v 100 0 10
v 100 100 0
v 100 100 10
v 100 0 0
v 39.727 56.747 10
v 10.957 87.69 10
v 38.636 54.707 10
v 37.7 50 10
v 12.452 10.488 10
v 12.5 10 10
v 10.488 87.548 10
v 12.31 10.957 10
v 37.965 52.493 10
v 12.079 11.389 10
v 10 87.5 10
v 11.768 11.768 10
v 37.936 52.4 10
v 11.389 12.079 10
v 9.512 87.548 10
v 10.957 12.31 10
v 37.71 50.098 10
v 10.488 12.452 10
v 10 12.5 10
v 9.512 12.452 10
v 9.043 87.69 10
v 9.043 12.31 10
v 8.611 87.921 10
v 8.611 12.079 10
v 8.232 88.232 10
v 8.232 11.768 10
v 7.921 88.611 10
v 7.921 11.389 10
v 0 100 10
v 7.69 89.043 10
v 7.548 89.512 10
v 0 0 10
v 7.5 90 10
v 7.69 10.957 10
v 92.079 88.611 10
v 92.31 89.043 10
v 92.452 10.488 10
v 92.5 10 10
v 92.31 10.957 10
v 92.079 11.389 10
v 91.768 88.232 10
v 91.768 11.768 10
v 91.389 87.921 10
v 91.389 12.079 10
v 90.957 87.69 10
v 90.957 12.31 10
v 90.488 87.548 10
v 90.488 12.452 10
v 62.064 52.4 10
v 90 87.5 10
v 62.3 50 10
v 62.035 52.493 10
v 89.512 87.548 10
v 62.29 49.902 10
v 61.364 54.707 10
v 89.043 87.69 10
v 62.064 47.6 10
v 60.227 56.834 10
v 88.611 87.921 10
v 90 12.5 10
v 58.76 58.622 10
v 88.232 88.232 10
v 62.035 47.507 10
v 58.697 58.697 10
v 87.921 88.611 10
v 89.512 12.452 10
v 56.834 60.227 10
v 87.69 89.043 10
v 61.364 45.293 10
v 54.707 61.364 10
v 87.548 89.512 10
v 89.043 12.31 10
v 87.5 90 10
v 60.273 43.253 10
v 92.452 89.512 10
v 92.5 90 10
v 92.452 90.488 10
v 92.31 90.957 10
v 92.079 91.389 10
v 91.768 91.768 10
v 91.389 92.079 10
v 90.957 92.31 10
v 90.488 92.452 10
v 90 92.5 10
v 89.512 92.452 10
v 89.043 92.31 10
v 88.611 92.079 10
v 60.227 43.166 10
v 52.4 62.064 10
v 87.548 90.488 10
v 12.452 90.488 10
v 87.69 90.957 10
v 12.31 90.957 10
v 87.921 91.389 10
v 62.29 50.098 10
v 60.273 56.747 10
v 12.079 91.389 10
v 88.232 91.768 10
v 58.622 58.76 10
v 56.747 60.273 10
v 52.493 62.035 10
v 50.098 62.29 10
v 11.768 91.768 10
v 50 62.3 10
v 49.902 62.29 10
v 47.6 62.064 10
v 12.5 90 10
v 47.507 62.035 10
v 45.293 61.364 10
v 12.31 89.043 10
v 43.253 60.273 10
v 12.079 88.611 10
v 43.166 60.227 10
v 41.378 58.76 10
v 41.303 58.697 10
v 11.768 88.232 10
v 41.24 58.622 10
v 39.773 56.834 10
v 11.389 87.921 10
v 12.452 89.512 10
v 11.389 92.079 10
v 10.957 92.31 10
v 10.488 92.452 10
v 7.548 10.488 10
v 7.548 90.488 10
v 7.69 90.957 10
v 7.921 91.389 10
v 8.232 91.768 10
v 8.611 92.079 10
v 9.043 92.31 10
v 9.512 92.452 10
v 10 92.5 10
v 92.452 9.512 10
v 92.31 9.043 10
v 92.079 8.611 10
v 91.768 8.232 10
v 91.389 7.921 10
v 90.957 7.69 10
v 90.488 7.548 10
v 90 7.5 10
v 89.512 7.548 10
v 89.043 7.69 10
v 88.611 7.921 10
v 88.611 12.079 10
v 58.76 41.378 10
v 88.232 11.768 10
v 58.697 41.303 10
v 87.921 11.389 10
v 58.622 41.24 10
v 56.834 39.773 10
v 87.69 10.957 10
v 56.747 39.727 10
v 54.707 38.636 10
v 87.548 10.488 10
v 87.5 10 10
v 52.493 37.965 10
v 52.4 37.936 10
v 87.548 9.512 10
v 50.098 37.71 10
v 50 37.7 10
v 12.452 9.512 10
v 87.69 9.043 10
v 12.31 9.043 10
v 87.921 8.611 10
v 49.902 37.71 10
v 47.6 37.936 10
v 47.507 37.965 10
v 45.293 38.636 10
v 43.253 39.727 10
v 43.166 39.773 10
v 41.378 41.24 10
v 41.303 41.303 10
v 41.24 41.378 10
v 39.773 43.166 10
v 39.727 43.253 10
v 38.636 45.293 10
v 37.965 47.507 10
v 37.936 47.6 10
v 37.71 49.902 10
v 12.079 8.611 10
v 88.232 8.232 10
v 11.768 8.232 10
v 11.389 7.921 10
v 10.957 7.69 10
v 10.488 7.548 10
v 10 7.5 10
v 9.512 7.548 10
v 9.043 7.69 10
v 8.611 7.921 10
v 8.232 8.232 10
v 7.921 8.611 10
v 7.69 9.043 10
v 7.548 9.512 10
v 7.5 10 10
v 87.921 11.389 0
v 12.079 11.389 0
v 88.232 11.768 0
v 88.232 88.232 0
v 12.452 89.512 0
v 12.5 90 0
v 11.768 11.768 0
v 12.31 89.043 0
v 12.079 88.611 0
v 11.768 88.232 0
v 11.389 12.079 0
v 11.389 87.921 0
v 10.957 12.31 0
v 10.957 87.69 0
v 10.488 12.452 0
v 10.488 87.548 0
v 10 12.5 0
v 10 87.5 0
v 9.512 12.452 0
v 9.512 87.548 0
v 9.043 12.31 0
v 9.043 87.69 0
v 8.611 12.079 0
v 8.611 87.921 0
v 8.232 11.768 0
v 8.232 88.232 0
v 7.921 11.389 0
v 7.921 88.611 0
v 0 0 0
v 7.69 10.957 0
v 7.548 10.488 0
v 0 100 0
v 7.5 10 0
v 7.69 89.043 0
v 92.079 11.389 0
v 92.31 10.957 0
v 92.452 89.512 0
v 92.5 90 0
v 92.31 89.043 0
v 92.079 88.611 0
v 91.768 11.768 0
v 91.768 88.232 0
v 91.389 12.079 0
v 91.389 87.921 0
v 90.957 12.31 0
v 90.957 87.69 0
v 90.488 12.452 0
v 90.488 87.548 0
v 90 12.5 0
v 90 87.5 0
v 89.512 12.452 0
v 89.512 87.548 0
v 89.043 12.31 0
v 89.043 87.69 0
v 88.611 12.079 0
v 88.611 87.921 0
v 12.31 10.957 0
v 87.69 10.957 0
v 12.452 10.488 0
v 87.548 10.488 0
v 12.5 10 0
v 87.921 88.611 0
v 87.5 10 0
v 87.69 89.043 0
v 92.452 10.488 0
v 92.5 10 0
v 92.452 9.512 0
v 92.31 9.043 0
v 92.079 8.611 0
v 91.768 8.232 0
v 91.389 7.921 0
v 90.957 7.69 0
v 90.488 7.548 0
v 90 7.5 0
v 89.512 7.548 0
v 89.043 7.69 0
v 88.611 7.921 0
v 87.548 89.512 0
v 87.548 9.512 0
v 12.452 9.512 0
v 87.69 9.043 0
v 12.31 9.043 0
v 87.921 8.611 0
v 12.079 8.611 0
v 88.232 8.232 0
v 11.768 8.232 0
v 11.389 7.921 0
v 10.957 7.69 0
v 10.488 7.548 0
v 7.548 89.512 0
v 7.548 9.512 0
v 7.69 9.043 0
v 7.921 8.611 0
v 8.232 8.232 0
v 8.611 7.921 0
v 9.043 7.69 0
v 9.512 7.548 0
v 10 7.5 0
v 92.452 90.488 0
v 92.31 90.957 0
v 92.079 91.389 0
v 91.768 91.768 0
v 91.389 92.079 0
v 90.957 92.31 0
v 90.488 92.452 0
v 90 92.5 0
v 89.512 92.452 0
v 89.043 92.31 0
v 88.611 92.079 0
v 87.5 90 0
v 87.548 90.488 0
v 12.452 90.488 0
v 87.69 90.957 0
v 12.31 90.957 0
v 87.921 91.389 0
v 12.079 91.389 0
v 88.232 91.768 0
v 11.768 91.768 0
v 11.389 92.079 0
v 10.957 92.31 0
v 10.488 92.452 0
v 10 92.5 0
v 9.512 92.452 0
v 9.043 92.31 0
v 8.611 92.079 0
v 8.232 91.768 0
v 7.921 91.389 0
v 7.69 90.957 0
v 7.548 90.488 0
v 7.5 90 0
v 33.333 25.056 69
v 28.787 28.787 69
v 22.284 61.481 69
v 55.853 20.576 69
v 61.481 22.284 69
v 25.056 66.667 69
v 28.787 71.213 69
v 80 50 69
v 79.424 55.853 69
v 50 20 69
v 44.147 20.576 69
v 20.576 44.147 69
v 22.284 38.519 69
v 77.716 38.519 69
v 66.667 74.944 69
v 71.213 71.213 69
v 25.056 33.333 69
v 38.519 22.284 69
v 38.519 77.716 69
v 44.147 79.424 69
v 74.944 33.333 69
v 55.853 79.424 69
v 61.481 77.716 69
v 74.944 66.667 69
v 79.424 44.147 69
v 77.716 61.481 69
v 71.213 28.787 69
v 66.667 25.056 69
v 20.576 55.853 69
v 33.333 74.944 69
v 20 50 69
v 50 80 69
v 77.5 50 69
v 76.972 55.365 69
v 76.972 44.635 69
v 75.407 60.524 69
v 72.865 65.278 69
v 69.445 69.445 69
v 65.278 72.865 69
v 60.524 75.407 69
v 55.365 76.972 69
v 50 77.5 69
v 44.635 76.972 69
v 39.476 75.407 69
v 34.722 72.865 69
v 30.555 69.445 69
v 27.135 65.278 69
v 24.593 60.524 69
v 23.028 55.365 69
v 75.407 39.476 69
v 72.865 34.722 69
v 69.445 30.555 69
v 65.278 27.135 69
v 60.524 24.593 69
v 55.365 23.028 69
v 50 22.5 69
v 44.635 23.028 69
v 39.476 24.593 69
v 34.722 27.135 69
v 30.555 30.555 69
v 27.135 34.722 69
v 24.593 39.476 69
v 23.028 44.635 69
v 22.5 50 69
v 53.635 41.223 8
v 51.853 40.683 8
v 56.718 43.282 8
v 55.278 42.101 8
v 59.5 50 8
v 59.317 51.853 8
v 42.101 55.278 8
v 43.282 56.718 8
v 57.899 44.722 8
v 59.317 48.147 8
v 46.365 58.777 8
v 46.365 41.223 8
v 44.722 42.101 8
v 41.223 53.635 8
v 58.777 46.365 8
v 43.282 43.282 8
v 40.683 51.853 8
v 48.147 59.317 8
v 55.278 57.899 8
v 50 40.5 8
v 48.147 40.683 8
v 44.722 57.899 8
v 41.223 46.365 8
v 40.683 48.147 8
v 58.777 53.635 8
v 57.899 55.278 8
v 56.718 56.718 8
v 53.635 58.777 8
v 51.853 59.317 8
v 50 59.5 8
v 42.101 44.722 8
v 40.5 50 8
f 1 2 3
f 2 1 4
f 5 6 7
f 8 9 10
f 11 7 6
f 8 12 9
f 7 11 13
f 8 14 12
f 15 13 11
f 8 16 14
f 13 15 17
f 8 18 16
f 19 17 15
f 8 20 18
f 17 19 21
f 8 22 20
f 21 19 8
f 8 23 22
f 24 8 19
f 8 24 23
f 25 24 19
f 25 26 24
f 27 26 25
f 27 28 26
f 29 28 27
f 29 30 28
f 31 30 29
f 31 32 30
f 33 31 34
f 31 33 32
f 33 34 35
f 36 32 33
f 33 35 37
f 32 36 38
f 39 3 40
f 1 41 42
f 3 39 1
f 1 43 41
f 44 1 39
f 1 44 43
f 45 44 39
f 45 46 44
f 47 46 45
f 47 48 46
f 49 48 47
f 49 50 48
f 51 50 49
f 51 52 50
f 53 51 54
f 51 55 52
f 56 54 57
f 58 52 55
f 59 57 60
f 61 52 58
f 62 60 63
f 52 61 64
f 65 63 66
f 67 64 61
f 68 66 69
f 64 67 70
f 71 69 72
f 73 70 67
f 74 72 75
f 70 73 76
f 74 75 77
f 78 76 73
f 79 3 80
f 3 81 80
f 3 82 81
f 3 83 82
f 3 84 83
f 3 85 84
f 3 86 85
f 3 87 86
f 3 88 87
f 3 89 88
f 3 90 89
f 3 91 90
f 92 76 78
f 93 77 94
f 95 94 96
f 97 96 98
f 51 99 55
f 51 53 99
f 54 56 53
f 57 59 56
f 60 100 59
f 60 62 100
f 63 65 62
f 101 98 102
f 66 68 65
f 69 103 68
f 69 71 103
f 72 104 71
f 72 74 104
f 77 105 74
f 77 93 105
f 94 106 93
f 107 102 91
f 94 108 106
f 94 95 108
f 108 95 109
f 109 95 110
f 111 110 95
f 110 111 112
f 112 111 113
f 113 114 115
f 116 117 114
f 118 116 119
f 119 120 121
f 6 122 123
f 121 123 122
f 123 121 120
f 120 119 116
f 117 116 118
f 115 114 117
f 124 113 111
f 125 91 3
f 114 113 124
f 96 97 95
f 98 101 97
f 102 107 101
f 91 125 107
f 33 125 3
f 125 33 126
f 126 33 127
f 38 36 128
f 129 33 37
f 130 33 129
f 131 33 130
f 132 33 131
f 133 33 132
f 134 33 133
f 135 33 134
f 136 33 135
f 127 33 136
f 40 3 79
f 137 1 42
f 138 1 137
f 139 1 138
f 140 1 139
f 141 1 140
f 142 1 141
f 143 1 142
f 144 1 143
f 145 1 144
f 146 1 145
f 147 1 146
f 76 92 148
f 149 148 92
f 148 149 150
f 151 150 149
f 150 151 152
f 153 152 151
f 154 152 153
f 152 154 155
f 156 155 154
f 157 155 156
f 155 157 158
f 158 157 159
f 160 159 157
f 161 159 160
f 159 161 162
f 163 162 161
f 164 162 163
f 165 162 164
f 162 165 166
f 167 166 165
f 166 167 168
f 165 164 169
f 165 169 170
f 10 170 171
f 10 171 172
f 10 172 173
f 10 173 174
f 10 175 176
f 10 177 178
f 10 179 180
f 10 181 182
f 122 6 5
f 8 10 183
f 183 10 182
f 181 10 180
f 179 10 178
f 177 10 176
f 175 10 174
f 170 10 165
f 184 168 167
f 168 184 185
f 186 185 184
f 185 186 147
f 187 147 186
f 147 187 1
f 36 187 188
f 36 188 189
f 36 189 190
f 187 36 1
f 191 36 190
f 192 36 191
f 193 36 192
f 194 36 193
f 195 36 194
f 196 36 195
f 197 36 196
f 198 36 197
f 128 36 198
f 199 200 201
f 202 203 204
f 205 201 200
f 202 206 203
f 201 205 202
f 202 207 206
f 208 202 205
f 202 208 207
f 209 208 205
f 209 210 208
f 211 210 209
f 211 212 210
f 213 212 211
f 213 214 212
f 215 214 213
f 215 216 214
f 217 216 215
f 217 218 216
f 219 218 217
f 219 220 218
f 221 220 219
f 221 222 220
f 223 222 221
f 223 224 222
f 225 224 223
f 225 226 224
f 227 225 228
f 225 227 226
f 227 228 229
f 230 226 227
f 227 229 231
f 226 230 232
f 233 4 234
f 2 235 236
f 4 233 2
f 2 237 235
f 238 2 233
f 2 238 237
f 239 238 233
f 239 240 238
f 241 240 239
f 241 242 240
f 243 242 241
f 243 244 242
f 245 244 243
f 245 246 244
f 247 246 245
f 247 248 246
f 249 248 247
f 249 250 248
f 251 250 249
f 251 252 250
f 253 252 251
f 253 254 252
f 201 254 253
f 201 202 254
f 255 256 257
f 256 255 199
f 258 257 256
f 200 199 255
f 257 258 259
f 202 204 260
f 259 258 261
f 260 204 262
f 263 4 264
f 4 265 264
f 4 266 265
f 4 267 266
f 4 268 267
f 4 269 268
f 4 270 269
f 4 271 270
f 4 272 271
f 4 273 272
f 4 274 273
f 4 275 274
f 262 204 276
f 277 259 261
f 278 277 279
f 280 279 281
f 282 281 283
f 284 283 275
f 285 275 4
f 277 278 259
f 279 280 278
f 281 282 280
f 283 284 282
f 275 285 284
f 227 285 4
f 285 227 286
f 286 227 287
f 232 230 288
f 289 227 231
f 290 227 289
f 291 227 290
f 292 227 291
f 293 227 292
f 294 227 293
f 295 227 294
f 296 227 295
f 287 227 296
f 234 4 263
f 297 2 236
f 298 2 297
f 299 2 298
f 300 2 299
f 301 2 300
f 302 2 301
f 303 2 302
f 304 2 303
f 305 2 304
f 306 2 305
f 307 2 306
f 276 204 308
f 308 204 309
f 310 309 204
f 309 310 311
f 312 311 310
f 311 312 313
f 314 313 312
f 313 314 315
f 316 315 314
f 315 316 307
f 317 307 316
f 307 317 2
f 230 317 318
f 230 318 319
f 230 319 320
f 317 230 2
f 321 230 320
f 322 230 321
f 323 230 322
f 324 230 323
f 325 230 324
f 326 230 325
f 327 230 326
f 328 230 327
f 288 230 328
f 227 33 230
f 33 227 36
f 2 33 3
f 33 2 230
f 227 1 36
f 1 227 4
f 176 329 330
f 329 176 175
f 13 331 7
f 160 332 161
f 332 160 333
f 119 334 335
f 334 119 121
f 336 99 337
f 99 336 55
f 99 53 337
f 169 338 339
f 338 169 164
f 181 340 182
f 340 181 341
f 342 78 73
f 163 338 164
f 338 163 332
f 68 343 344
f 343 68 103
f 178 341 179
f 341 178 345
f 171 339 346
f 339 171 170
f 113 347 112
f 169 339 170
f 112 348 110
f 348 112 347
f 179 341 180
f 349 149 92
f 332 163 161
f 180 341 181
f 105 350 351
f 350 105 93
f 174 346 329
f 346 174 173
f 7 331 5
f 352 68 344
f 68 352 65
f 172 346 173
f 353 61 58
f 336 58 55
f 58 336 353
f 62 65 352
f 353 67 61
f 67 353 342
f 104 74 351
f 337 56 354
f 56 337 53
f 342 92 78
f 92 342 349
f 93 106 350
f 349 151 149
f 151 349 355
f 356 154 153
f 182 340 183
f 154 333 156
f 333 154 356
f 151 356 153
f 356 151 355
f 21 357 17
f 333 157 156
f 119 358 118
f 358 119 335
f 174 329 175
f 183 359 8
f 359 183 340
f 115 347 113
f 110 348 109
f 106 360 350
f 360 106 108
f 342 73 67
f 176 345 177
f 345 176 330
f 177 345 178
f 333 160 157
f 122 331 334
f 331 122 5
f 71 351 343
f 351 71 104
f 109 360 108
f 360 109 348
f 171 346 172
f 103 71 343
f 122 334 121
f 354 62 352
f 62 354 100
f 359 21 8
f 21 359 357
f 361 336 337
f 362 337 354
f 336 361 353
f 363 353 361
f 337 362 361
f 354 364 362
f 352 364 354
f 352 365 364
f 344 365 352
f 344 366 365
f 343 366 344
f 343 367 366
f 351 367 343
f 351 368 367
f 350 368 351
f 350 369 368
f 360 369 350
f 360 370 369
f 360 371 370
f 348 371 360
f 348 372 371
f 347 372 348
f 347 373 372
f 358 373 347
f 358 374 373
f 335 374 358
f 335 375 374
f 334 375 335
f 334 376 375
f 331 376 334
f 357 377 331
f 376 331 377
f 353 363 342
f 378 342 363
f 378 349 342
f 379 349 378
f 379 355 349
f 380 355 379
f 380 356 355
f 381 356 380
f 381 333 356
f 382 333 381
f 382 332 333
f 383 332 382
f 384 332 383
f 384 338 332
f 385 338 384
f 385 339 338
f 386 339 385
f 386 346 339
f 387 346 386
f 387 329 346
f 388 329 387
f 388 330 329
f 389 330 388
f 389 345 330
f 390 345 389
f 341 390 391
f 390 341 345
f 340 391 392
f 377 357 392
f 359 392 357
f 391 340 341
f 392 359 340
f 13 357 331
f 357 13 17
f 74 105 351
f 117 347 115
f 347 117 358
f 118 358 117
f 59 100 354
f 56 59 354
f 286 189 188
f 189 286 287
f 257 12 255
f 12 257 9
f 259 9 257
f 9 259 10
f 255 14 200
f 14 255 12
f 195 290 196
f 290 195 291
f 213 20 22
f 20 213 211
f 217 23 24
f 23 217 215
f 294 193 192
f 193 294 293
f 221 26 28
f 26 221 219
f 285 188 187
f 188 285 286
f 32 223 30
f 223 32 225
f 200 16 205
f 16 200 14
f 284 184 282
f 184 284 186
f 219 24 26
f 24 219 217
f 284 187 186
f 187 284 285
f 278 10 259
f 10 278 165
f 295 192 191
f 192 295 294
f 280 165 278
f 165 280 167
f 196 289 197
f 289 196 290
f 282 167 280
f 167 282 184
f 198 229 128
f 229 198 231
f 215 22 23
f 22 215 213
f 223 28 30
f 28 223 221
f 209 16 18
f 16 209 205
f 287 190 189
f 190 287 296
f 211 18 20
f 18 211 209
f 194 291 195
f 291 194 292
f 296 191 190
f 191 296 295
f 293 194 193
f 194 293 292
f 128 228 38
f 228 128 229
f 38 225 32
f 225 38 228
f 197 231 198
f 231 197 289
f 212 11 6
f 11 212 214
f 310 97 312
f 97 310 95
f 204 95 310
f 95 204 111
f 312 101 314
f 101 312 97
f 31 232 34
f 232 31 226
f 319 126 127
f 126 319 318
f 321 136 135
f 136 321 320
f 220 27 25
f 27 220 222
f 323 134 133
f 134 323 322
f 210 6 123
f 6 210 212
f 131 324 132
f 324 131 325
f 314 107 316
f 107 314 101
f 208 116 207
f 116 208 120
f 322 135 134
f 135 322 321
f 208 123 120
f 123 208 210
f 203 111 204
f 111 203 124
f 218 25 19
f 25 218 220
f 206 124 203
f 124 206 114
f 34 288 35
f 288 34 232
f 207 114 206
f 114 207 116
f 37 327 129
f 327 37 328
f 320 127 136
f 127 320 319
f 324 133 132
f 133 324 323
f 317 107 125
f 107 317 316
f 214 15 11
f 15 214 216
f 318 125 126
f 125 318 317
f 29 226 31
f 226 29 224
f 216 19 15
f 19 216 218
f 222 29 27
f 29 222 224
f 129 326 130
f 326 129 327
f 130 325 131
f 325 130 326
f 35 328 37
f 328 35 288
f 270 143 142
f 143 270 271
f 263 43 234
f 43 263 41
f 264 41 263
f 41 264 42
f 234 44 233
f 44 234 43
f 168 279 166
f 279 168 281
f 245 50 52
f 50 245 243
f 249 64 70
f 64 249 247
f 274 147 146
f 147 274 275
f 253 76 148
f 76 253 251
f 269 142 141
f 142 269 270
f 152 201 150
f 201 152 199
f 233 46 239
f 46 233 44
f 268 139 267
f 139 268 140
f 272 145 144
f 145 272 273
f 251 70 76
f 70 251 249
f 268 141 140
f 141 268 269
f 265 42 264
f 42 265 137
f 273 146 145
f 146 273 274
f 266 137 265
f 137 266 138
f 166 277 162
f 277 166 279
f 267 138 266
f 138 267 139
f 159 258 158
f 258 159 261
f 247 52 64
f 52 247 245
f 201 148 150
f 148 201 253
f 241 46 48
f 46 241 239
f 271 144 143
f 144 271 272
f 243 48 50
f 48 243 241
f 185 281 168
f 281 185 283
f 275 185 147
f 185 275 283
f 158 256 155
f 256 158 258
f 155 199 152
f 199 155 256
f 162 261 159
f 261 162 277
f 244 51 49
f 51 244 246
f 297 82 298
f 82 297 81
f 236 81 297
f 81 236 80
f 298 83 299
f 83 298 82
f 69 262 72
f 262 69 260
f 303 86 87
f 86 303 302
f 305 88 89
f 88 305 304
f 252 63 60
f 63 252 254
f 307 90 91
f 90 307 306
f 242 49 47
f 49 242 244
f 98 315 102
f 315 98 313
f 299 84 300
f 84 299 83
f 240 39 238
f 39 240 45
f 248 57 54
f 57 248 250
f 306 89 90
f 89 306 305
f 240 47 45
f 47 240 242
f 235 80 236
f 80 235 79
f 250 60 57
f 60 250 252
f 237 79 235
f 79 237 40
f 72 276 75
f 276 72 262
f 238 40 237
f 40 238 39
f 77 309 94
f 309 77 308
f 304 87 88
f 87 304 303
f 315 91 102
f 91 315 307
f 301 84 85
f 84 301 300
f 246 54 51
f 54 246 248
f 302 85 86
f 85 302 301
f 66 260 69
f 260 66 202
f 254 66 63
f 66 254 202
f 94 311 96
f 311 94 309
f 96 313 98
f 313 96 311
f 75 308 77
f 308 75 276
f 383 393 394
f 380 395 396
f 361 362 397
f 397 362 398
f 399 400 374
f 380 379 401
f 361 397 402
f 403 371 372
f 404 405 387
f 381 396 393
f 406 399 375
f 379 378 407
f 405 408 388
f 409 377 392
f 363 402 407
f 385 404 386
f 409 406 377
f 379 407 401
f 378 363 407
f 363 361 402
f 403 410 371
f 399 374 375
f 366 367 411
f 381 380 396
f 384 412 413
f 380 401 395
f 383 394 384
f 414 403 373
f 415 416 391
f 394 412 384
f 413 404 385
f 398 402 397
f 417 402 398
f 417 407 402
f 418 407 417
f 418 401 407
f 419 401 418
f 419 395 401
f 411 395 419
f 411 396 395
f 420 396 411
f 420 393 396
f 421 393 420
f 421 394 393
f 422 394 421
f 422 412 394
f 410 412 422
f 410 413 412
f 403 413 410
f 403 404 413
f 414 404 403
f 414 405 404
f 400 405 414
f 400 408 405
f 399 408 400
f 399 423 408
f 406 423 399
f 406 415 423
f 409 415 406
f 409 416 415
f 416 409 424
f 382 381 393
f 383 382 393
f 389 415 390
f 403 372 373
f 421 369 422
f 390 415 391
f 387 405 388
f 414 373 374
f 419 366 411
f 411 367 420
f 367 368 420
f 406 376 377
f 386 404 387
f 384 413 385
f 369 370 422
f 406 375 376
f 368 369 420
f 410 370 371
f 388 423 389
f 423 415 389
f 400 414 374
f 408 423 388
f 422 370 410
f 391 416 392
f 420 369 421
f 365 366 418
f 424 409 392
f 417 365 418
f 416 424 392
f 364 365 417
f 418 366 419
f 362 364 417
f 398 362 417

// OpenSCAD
$fn = 32;

// ----------------------------------------------------------------------
// Hopper: flanged with square flange
// ----------------------------------------------------------------------

// --- parameters (mm) ---
fl = 100;                 // flange side, X and Y
fl_t = 10;                // flange thickness
cone_h = 60;              // cone height above the flange
top_d = 60;               // cone mouth diameter
bot_d = 24;               // cone spout diameter
wall = 2.5;               // cone wall thickness
hole_r = 2.5;             // flange hole radius
hole_in = 10;             // hole inset from the corners

bore_d = bot_d - 2 * wall;  // spout bore diameter
total_h = fl_t + cone_h - 1;  // overall height

difference() {
  union() {
    cube([fl, fl, fl_t]);
    translate([fl / 2, fl / 2, fl_t - 1])
      cylinder(h = cone_h, d1 = bot_d, d2 = top_d);
  }
  translate([fl / 2, fl / 2, fl_t - 2])
    cylinder(h = cone_h + 1, d1 = bore_d, d2 = top_d - 2 * wall);
  for (sx = [0, 1], sy = [0, 1])
    translate([sx ? fl - hole_in : hole_in,
               sy ? fl - hole_in : hole_in, -1])
      cylinder(r = hole_r, h = fl_t + 2);
}
